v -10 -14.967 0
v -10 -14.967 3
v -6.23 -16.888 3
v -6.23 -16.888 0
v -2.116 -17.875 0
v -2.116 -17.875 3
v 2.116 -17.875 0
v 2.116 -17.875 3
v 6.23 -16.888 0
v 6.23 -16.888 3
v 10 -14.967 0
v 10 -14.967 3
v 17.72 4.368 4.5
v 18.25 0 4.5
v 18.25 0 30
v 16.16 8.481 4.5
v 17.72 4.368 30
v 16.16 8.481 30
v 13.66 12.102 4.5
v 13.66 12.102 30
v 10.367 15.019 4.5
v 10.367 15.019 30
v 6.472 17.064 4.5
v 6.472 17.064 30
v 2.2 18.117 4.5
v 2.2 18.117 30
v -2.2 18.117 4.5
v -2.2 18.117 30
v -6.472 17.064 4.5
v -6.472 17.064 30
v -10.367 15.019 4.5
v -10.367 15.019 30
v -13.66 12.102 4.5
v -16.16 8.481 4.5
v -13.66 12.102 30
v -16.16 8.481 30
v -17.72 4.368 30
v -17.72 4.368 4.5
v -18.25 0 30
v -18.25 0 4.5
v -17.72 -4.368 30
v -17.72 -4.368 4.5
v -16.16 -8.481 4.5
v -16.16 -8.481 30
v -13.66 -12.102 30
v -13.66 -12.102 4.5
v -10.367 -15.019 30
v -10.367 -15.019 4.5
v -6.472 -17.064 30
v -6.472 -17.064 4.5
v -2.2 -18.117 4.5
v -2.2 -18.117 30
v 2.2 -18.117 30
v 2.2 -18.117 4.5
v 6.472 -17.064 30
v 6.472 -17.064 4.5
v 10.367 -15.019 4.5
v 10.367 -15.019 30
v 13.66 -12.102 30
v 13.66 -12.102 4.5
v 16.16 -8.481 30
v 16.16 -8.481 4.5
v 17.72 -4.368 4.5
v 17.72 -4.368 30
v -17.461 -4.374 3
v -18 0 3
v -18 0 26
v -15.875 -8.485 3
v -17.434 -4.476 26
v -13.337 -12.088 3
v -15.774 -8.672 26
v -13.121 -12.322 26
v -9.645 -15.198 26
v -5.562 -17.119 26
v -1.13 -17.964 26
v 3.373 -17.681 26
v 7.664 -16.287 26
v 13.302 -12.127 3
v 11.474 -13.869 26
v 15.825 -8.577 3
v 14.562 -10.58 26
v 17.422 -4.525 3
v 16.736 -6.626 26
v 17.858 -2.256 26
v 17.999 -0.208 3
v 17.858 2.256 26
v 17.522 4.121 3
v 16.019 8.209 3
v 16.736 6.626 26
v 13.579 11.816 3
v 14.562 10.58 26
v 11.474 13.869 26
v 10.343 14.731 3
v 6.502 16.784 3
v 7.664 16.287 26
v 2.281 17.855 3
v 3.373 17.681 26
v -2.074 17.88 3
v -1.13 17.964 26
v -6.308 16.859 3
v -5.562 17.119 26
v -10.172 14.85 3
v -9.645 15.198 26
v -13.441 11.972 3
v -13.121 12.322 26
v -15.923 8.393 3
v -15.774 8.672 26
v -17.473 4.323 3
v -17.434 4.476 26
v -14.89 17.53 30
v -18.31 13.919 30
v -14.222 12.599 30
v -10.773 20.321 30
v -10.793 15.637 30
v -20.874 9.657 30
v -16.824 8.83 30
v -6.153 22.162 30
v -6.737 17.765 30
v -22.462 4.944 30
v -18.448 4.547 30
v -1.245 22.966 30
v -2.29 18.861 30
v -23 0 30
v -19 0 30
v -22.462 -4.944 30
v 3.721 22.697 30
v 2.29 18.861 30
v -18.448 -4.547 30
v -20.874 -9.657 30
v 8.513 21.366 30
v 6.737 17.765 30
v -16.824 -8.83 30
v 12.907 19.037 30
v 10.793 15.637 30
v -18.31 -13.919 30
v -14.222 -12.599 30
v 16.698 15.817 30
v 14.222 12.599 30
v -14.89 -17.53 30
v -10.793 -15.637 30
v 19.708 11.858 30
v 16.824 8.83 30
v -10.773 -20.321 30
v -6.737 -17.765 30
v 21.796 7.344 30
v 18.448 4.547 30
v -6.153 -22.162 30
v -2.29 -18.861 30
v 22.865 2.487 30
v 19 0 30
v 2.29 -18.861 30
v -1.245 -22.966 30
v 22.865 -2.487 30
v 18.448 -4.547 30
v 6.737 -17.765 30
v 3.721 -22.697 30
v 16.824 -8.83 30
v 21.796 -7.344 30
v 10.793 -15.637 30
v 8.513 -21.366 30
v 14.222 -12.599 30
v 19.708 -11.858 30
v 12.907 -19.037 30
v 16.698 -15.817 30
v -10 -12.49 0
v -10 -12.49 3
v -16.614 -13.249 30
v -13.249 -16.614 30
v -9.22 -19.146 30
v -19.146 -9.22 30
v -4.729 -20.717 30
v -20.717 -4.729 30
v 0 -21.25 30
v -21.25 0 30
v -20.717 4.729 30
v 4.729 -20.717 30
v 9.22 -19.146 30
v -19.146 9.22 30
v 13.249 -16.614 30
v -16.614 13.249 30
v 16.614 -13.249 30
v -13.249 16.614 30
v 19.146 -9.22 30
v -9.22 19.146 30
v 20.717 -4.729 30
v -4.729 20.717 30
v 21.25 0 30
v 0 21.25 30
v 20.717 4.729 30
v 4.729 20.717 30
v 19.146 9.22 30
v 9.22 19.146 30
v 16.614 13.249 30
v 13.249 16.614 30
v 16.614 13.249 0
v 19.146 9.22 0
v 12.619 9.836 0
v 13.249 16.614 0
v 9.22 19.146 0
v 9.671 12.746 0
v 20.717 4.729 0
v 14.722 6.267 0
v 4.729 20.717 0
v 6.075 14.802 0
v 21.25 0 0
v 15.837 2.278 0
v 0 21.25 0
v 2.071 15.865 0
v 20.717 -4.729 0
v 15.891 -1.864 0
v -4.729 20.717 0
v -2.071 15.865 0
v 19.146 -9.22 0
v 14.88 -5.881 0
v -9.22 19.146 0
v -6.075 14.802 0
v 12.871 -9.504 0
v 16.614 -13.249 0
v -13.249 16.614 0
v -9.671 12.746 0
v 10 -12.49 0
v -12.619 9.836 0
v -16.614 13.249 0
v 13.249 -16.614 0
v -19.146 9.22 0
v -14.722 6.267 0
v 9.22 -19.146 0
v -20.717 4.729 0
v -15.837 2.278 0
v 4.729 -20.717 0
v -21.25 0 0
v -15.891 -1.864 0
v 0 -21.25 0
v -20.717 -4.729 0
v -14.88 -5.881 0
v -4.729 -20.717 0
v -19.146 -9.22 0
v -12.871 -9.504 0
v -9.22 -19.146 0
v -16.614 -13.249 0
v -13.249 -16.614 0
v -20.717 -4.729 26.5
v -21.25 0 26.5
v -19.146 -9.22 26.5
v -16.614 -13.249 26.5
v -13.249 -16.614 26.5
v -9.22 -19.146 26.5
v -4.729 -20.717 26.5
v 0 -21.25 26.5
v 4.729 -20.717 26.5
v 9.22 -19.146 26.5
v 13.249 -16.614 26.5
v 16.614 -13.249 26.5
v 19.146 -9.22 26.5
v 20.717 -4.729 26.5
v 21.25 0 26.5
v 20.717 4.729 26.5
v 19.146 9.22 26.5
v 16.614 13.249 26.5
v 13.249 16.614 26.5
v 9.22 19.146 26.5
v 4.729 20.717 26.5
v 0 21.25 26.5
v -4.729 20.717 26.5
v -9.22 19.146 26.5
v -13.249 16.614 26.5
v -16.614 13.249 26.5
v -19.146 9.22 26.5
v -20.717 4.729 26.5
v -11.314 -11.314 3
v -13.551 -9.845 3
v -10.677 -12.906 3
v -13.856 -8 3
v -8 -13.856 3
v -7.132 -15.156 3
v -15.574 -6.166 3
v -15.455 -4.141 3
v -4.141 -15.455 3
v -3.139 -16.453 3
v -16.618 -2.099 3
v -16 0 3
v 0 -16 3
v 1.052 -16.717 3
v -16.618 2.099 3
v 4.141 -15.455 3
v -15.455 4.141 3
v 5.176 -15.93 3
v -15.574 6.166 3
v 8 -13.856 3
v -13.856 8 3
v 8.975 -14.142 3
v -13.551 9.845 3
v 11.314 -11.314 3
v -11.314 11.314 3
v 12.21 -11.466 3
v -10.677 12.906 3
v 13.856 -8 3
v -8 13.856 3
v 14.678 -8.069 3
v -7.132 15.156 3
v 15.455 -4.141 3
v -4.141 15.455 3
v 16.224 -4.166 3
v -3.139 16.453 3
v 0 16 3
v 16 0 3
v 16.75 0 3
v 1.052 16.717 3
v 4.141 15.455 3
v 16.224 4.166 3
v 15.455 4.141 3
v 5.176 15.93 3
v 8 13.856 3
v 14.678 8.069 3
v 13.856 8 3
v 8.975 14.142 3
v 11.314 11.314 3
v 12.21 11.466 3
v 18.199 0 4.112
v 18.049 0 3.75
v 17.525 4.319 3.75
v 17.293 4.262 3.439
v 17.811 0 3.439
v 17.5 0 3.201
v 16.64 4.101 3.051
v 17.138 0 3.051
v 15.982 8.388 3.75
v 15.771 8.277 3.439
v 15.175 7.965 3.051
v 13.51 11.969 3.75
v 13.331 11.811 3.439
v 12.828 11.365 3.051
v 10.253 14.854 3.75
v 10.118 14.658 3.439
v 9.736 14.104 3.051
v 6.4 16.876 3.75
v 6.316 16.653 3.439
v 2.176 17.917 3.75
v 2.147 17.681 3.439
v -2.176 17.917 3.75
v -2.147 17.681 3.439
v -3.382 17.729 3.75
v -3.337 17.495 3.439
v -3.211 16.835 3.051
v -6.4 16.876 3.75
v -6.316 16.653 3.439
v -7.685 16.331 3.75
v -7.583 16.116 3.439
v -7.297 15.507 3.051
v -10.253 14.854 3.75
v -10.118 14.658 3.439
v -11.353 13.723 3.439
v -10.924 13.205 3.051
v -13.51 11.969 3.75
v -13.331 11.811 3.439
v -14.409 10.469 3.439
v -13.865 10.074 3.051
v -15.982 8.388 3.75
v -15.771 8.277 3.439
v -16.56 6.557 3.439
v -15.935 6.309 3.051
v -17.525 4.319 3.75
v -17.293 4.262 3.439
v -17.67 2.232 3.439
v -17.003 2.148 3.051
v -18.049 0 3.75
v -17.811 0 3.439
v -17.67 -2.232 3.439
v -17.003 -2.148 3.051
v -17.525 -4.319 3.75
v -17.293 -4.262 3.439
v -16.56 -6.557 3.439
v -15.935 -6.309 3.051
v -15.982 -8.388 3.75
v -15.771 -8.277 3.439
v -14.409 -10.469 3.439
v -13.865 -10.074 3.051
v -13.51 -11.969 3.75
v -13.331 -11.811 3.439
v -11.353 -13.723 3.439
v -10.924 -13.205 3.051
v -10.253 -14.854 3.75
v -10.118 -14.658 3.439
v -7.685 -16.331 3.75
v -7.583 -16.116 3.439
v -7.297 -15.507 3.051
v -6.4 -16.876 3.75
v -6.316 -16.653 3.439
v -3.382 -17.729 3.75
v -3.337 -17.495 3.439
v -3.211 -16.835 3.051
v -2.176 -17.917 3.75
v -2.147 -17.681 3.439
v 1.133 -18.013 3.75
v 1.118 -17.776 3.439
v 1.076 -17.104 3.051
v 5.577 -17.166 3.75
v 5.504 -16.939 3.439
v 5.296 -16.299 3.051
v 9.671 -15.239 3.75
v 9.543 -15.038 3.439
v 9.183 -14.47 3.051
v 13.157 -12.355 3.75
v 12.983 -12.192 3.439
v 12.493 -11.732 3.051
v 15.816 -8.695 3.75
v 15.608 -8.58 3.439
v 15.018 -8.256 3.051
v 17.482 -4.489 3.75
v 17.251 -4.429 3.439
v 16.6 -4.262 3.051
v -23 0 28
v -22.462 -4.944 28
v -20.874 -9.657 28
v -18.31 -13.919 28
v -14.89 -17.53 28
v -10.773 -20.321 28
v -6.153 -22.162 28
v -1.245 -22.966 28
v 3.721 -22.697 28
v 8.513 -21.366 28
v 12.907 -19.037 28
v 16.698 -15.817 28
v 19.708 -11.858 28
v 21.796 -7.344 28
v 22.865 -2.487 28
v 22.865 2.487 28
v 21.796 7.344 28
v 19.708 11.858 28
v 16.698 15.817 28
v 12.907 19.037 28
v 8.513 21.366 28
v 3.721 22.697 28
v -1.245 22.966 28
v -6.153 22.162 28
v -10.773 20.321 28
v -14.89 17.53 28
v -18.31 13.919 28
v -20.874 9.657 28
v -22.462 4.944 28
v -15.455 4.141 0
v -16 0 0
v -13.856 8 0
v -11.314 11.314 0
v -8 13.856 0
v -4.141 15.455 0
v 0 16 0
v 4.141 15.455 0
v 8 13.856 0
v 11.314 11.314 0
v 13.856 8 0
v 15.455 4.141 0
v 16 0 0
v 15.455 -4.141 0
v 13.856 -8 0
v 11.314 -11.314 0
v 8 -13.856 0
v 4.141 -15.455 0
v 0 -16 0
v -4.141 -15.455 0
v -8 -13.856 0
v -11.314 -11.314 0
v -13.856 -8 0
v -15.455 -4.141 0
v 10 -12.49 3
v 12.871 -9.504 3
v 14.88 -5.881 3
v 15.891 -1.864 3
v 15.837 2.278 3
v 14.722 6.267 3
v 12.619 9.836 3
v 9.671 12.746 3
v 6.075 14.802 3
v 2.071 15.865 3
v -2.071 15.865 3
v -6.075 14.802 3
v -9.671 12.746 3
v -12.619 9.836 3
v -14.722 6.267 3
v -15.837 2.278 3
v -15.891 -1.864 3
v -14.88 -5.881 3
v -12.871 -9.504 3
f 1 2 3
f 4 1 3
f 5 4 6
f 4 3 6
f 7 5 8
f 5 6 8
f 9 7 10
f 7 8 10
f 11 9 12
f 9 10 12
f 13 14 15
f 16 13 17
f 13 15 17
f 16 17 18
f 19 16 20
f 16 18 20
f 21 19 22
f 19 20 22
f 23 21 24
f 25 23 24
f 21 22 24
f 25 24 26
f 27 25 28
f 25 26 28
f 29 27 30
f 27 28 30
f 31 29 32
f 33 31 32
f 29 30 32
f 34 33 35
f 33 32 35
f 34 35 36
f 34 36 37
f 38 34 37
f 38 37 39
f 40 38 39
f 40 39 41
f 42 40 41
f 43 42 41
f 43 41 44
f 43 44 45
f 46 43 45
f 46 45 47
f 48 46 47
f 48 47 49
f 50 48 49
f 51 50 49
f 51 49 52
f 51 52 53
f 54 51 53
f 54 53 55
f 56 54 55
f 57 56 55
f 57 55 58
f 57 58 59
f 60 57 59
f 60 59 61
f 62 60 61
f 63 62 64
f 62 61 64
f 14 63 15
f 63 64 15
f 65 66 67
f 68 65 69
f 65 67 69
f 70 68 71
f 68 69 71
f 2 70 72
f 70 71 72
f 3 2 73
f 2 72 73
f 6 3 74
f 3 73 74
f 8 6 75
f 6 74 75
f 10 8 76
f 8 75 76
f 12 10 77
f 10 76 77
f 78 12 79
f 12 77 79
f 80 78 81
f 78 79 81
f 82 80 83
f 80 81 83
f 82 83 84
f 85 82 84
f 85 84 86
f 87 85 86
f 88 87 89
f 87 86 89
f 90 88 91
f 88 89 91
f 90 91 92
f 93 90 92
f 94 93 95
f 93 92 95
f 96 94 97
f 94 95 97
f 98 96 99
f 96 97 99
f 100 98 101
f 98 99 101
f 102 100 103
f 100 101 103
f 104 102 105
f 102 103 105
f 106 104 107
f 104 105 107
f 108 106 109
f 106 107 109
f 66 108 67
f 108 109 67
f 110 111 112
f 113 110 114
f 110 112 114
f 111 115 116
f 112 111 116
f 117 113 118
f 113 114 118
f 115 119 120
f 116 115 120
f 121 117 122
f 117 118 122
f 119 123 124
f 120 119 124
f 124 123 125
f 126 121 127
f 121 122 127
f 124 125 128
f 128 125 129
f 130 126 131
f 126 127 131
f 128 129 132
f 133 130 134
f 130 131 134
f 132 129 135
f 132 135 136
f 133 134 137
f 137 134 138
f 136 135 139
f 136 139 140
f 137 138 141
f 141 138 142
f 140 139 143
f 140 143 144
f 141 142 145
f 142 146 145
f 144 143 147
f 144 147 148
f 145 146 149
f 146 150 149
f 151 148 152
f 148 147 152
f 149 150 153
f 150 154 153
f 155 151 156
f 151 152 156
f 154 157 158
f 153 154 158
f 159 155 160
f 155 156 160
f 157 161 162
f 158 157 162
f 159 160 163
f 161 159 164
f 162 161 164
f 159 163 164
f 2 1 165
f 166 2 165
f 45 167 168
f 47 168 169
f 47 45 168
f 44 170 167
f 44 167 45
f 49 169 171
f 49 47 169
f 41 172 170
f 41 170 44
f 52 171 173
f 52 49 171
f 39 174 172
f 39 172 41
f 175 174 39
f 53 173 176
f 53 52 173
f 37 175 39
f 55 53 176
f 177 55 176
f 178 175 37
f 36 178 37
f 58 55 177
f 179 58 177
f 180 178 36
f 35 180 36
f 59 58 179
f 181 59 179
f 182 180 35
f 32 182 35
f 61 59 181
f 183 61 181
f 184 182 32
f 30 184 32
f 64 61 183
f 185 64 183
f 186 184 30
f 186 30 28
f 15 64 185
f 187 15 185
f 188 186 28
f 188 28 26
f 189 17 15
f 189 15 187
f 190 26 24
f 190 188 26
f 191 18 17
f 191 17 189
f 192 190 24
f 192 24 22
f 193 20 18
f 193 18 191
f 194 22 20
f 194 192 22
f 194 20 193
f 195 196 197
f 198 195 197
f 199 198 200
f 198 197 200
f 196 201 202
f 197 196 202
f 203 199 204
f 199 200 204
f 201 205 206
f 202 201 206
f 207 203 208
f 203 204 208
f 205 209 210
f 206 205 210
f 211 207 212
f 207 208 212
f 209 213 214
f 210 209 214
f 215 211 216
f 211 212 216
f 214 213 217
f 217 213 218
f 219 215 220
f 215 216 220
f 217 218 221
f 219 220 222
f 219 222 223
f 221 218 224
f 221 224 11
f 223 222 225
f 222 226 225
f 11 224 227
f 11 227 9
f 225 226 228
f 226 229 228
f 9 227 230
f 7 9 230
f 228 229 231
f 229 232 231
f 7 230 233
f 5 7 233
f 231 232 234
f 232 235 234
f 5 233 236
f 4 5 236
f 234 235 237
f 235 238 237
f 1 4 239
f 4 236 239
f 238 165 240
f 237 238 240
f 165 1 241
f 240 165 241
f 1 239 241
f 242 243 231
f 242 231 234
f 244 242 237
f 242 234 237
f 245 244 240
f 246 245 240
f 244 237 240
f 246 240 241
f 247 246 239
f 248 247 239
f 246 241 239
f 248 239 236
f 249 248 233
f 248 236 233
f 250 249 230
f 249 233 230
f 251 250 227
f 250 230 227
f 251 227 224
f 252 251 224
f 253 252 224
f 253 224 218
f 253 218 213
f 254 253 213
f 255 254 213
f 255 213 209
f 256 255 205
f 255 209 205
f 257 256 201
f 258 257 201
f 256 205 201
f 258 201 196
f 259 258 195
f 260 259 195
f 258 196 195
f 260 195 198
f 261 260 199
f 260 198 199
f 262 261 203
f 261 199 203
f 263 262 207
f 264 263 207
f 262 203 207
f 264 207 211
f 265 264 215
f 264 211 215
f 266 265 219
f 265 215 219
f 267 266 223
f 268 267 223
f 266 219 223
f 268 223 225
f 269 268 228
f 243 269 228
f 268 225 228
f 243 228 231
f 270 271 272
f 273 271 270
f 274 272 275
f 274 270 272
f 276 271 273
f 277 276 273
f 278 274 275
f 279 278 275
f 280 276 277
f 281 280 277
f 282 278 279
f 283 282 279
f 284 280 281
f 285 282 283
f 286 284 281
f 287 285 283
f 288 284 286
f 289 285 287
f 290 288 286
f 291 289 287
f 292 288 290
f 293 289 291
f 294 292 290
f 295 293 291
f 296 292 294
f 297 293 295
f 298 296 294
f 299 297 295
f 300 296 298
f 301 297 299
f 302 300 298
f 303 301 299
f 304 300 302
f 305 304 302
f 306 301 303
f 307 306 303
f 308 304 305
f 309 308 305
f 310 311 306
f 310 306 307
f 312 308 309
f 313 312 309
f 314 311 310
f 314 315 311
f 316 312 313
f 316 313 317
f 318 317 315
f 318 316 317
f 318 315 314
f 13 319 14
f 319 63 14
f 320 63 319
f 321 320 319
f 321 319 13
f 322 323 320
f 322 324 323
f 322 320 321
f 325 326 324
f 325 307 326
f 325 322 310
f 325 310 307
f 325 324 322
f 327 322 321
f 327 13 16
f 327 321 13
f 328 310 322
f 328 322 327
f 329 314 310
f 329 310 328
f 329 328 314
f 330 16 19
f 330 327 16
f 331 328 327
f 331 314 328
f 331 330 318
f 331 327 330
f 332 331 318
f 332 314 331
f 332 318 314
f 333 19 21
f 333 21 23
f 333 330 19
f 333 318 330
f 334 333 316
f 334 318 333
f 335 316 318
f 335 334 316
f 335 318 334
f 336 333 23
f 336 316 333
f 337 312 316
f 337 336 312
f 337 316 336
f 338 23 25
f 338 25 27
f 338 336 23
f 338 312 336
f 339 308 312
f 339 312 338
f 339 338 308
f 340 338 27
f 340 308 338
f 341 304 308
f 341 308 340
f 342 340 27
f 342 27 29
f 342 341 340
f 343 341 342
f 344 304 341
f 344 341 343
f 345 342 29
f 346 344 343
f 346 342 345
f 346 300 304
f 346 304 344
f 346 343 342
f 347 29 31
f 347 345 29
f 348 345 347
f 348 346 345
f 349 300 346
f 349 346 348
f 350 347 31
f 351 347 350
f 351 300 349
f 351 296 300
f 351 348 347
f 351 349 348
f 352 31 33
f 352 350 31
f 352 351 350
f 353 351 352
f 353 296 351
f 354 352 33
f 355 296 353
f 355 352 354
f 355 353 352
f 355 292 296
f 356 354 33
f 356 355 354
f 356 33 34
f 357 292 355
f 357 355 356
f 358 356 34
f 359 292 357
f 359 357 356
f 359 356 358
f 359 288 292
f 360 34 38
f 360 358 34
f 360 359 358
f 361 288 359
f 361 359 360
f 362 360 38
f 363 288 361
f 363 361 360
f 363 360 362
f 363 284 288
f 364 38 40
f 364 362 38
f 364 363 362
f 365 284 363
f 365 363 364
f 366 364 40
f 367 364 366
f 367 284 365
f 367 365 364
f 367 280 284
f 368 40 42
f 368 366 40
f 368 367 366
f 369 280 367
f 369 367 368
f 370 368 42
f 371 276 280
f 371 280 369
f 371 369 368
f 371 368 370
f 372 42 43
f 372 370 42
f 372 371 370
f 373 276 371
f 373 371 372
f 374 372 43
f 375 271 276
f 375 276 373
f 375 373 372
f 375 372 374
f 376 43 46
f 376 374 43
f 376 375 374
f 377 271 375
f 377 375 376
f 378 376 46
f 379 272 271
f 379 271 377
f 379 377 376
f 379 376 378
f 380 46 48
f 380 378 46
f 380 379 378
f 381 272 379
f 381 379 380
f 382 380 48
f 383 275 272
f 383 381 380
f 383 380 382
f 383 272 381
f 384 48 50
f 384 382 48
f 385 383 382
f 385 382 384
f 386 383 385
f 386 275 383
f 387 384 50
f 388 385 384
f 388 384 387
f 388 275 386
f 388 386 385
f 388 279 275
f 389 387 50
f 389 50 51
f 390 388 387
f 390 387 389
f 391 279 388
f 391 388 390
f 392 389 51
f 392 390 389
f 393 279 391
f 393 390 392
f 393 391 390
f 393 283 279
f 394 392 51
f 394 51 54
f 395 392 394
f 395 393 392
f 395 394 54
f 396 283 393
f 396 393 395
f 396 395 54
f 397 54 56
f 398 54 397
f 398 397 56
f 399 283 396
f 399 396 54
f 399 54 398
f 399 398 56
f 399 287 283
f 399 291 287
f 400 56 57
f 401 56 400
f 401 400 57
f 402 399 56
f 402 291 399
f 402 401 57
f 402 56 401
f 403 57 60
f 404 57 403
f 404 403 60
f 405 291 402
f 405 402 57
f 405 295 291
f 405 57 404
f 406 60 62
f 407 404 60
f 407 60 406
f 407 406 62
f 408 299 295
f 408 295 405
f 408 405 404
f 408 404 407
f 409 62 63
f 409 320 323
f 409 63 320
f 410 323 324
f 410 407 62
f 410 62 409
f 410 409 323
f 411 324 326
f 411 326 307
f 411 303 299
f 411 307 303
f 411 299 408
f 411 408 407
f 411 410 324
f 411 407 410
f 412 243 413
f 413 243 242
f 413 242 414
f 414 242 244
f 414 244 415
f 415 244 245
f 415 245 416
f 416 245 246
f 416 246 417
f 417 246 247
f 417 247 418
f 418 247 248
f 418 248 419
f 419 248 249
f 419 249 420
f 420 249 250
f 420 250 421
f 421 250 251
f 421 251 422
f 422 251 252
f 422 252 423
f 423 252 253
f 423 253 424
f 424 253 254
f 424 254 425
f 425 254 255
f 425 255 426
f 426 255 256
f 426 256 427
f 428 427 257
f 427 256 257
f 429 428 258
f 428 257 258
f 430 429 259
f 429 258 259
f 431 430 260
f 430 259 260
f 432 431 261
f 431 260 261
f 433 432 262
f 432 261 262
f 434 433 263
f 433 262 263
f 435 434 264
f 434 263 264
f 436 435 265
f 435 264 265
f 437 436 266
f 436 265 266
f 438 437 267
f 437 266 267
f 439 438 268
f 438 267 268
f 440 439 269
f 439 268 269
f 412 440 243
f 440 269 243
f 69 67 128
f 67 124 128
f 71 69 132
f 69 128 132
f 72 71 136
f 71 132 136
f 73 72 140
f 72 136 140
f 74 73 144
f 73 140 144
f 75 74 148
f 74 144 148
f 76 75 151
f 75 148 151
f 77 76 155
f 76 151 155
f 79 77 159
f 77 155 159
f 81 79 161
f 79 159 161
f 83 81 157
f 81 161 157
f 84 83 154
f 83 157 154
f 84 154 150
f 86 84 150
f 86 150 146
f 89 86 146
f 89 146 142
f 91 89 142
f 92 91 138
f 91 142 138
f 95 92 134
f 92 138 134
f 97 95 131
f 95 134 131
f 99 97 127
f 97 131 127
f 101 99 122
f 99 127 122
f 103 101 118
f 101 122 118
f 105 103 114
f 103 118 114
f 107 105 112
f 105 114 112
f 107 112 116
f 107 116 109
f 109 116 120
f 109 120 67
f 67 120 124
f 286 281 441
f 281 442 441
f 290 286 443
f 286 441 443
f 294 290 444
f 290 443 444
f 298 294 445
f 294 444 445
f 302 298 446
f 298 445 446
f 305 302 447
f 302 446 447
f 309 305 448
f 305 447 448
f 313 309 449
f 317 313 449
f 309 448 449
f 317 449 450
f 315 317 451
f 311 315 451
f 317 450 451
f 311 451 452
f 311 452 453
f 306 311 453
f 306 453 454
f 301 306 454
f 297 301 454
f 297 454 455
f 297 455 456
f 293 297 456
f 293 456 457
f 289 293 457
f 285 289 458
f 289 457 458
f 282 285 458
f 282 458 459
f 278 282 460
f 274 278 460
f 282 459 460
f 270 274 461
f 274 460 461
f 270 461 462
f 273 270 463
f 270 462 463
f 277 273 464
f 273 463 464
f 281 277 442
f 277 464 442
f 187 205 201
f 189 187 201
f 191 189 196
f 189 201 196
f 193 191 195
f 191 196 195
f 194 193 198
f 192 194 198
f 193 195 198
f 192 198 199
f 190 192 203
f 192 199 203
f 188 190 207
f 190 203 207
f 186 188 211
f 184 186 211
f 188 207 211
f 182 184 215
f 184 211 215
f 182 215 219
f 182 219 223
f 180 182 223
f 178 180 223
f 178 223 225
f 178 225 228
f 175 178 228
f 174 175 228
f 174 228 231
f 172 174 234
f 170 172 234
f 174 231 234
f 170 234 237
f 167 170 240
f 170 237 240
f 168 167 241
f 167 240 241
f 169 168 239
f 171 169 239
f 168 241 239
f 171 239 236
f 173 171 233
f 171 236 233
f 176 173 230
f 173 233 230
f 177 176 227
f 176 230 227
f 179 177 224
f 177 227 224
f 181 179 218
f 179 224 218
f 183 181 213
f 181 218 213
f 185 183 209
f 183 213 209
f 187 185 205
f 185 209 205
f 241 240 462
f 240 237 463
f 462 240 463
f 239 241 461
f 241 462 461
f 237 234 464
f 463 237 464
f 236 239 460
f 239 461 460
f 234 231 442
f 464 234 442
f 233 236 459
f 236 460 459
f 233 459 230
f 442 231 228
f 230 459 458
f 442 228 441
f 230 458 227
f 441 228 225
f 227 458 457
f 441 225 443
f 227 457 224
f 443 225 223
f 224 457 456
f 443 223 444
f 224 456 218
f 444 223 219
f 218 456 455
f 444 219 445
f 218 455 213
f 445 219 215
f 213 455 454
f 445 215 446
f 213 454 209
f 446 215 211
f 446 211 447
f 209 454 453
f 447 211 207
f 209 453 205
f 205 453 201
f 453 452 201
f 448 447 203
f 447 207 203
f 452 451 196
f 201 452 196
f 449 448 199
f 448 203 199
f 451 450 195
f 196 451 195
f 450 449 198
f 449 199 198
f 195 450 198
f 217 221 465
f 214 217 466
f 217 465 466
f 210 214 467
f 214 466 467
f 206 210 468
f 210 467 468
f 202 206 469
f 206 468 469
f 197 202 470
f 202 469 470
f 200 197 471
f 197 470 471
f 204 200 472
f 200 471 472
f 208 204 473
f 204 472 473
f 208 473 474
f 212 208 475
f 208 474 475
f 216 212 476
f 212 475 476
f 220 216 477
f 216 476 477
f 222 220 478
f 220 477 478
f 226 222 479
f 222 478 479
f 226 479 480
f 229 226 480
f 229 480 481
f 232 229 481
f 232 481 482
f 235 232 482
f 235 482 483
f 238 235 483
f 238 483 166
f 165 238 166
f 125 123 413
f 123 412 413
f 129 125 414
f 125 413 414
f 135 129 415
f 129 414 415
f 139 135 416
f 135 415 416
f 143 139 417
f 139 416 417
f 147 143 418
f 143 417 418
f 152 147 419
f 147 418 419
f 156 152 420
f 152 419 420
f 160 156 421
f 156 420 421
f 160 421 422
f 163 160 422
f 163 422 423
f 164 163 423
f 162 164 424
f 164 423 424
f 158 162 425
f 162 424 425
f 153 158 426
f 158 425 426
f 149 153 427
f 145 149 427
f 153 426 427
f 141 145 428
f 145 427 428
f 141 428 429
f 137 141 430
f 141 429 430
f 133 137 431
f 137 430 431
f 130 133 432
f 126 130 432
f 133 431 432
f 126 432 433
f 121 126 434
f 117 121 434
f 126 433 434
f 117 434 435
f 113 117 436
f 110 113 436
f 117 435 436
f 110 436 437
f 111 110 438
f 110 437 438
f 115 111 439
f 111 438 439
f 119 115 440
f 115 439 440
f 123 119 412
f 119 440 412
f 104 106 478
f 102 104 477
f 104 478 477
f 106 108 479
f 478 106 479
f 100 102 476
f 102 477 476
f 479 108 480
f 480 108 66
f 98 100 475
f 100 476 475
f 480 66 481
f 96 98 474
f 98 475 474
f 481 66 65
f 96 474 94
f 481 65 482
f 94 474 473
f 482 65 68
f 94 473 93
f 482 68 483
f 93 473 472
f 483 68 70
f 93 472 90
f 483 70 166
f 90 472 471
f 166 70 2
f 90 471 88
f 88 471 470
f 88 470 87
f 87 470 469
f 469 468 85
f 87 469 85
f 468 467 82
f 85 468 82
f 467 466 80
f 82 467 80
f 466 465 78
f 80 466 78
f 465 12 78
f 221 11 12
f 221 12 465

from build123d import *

# Parameters (mm, degrees)
SKETCH_R         = 21.25
PAD_DEPTH        = 30
HOLE_D           = 32
HOLE_CBORE_D     = 36.5
HOLE_CBORE_DEPTH = 27
FILLET_R         = 1.5
POCKET_DEPTH     = 5


with BuildPart() as body:
    # Sketch → Pad (new body)
    with BuildSketch(Plane.XY):
        Circle(SKETCH_R)
    extrude(amount=PAD_DEPTH)

    # Hole (through all)
    with Locations(Plane.XY.offset(30)):
        with Locations((0, 0)):
            CounterBoreHole(HOLE_D / 2, HOLE_CBORE_D / 2, HOLE_CBORE_DEPTH)

    # Fillet
    fillet_edges = [body.edges().sort_by_distance(p)[0] for p in [
        (-18.25, 0, 3),
    ]]
    fillet(fillet_edges, radius=FILLET_R)


with BuildPart() as body001:
    # Sketch002 → Revolution (revolve)
    with BuildSketch(Plane.XZ):
        Polygon((-21.25, 26.5), (-21.25, 0), (-16, 0), (-16, 3), (-18, 3), (-18, 26), (-19, 30), (-23, 30), (-23, 28), align=None)
    revolve(axis=Axis((0, 0, 0), (0, 0, 1)))

    # Sketch003 (on Face6 of Revolution) → Pocket (cut)
    with BuildSketch(Plane(origin=(0, 0, 3), x_dir=(-1, 0, 0), z_dir=(0, 0, 1))):
        with BuildLine():
            ThreePointArc((10, 14.96663), (0, 18), (-10, 14.96663))
            Line((-10, 14.96663), (-10, 0))
            Line((-10, 0), (10, 0))
            Line((10, 14.96663), (10, 0))
        make_face()
    extrude(amount=-POCKET_DEPTH, mode=Mode.SUBTRACT)


solid = Compound([body.part, body001.part])
